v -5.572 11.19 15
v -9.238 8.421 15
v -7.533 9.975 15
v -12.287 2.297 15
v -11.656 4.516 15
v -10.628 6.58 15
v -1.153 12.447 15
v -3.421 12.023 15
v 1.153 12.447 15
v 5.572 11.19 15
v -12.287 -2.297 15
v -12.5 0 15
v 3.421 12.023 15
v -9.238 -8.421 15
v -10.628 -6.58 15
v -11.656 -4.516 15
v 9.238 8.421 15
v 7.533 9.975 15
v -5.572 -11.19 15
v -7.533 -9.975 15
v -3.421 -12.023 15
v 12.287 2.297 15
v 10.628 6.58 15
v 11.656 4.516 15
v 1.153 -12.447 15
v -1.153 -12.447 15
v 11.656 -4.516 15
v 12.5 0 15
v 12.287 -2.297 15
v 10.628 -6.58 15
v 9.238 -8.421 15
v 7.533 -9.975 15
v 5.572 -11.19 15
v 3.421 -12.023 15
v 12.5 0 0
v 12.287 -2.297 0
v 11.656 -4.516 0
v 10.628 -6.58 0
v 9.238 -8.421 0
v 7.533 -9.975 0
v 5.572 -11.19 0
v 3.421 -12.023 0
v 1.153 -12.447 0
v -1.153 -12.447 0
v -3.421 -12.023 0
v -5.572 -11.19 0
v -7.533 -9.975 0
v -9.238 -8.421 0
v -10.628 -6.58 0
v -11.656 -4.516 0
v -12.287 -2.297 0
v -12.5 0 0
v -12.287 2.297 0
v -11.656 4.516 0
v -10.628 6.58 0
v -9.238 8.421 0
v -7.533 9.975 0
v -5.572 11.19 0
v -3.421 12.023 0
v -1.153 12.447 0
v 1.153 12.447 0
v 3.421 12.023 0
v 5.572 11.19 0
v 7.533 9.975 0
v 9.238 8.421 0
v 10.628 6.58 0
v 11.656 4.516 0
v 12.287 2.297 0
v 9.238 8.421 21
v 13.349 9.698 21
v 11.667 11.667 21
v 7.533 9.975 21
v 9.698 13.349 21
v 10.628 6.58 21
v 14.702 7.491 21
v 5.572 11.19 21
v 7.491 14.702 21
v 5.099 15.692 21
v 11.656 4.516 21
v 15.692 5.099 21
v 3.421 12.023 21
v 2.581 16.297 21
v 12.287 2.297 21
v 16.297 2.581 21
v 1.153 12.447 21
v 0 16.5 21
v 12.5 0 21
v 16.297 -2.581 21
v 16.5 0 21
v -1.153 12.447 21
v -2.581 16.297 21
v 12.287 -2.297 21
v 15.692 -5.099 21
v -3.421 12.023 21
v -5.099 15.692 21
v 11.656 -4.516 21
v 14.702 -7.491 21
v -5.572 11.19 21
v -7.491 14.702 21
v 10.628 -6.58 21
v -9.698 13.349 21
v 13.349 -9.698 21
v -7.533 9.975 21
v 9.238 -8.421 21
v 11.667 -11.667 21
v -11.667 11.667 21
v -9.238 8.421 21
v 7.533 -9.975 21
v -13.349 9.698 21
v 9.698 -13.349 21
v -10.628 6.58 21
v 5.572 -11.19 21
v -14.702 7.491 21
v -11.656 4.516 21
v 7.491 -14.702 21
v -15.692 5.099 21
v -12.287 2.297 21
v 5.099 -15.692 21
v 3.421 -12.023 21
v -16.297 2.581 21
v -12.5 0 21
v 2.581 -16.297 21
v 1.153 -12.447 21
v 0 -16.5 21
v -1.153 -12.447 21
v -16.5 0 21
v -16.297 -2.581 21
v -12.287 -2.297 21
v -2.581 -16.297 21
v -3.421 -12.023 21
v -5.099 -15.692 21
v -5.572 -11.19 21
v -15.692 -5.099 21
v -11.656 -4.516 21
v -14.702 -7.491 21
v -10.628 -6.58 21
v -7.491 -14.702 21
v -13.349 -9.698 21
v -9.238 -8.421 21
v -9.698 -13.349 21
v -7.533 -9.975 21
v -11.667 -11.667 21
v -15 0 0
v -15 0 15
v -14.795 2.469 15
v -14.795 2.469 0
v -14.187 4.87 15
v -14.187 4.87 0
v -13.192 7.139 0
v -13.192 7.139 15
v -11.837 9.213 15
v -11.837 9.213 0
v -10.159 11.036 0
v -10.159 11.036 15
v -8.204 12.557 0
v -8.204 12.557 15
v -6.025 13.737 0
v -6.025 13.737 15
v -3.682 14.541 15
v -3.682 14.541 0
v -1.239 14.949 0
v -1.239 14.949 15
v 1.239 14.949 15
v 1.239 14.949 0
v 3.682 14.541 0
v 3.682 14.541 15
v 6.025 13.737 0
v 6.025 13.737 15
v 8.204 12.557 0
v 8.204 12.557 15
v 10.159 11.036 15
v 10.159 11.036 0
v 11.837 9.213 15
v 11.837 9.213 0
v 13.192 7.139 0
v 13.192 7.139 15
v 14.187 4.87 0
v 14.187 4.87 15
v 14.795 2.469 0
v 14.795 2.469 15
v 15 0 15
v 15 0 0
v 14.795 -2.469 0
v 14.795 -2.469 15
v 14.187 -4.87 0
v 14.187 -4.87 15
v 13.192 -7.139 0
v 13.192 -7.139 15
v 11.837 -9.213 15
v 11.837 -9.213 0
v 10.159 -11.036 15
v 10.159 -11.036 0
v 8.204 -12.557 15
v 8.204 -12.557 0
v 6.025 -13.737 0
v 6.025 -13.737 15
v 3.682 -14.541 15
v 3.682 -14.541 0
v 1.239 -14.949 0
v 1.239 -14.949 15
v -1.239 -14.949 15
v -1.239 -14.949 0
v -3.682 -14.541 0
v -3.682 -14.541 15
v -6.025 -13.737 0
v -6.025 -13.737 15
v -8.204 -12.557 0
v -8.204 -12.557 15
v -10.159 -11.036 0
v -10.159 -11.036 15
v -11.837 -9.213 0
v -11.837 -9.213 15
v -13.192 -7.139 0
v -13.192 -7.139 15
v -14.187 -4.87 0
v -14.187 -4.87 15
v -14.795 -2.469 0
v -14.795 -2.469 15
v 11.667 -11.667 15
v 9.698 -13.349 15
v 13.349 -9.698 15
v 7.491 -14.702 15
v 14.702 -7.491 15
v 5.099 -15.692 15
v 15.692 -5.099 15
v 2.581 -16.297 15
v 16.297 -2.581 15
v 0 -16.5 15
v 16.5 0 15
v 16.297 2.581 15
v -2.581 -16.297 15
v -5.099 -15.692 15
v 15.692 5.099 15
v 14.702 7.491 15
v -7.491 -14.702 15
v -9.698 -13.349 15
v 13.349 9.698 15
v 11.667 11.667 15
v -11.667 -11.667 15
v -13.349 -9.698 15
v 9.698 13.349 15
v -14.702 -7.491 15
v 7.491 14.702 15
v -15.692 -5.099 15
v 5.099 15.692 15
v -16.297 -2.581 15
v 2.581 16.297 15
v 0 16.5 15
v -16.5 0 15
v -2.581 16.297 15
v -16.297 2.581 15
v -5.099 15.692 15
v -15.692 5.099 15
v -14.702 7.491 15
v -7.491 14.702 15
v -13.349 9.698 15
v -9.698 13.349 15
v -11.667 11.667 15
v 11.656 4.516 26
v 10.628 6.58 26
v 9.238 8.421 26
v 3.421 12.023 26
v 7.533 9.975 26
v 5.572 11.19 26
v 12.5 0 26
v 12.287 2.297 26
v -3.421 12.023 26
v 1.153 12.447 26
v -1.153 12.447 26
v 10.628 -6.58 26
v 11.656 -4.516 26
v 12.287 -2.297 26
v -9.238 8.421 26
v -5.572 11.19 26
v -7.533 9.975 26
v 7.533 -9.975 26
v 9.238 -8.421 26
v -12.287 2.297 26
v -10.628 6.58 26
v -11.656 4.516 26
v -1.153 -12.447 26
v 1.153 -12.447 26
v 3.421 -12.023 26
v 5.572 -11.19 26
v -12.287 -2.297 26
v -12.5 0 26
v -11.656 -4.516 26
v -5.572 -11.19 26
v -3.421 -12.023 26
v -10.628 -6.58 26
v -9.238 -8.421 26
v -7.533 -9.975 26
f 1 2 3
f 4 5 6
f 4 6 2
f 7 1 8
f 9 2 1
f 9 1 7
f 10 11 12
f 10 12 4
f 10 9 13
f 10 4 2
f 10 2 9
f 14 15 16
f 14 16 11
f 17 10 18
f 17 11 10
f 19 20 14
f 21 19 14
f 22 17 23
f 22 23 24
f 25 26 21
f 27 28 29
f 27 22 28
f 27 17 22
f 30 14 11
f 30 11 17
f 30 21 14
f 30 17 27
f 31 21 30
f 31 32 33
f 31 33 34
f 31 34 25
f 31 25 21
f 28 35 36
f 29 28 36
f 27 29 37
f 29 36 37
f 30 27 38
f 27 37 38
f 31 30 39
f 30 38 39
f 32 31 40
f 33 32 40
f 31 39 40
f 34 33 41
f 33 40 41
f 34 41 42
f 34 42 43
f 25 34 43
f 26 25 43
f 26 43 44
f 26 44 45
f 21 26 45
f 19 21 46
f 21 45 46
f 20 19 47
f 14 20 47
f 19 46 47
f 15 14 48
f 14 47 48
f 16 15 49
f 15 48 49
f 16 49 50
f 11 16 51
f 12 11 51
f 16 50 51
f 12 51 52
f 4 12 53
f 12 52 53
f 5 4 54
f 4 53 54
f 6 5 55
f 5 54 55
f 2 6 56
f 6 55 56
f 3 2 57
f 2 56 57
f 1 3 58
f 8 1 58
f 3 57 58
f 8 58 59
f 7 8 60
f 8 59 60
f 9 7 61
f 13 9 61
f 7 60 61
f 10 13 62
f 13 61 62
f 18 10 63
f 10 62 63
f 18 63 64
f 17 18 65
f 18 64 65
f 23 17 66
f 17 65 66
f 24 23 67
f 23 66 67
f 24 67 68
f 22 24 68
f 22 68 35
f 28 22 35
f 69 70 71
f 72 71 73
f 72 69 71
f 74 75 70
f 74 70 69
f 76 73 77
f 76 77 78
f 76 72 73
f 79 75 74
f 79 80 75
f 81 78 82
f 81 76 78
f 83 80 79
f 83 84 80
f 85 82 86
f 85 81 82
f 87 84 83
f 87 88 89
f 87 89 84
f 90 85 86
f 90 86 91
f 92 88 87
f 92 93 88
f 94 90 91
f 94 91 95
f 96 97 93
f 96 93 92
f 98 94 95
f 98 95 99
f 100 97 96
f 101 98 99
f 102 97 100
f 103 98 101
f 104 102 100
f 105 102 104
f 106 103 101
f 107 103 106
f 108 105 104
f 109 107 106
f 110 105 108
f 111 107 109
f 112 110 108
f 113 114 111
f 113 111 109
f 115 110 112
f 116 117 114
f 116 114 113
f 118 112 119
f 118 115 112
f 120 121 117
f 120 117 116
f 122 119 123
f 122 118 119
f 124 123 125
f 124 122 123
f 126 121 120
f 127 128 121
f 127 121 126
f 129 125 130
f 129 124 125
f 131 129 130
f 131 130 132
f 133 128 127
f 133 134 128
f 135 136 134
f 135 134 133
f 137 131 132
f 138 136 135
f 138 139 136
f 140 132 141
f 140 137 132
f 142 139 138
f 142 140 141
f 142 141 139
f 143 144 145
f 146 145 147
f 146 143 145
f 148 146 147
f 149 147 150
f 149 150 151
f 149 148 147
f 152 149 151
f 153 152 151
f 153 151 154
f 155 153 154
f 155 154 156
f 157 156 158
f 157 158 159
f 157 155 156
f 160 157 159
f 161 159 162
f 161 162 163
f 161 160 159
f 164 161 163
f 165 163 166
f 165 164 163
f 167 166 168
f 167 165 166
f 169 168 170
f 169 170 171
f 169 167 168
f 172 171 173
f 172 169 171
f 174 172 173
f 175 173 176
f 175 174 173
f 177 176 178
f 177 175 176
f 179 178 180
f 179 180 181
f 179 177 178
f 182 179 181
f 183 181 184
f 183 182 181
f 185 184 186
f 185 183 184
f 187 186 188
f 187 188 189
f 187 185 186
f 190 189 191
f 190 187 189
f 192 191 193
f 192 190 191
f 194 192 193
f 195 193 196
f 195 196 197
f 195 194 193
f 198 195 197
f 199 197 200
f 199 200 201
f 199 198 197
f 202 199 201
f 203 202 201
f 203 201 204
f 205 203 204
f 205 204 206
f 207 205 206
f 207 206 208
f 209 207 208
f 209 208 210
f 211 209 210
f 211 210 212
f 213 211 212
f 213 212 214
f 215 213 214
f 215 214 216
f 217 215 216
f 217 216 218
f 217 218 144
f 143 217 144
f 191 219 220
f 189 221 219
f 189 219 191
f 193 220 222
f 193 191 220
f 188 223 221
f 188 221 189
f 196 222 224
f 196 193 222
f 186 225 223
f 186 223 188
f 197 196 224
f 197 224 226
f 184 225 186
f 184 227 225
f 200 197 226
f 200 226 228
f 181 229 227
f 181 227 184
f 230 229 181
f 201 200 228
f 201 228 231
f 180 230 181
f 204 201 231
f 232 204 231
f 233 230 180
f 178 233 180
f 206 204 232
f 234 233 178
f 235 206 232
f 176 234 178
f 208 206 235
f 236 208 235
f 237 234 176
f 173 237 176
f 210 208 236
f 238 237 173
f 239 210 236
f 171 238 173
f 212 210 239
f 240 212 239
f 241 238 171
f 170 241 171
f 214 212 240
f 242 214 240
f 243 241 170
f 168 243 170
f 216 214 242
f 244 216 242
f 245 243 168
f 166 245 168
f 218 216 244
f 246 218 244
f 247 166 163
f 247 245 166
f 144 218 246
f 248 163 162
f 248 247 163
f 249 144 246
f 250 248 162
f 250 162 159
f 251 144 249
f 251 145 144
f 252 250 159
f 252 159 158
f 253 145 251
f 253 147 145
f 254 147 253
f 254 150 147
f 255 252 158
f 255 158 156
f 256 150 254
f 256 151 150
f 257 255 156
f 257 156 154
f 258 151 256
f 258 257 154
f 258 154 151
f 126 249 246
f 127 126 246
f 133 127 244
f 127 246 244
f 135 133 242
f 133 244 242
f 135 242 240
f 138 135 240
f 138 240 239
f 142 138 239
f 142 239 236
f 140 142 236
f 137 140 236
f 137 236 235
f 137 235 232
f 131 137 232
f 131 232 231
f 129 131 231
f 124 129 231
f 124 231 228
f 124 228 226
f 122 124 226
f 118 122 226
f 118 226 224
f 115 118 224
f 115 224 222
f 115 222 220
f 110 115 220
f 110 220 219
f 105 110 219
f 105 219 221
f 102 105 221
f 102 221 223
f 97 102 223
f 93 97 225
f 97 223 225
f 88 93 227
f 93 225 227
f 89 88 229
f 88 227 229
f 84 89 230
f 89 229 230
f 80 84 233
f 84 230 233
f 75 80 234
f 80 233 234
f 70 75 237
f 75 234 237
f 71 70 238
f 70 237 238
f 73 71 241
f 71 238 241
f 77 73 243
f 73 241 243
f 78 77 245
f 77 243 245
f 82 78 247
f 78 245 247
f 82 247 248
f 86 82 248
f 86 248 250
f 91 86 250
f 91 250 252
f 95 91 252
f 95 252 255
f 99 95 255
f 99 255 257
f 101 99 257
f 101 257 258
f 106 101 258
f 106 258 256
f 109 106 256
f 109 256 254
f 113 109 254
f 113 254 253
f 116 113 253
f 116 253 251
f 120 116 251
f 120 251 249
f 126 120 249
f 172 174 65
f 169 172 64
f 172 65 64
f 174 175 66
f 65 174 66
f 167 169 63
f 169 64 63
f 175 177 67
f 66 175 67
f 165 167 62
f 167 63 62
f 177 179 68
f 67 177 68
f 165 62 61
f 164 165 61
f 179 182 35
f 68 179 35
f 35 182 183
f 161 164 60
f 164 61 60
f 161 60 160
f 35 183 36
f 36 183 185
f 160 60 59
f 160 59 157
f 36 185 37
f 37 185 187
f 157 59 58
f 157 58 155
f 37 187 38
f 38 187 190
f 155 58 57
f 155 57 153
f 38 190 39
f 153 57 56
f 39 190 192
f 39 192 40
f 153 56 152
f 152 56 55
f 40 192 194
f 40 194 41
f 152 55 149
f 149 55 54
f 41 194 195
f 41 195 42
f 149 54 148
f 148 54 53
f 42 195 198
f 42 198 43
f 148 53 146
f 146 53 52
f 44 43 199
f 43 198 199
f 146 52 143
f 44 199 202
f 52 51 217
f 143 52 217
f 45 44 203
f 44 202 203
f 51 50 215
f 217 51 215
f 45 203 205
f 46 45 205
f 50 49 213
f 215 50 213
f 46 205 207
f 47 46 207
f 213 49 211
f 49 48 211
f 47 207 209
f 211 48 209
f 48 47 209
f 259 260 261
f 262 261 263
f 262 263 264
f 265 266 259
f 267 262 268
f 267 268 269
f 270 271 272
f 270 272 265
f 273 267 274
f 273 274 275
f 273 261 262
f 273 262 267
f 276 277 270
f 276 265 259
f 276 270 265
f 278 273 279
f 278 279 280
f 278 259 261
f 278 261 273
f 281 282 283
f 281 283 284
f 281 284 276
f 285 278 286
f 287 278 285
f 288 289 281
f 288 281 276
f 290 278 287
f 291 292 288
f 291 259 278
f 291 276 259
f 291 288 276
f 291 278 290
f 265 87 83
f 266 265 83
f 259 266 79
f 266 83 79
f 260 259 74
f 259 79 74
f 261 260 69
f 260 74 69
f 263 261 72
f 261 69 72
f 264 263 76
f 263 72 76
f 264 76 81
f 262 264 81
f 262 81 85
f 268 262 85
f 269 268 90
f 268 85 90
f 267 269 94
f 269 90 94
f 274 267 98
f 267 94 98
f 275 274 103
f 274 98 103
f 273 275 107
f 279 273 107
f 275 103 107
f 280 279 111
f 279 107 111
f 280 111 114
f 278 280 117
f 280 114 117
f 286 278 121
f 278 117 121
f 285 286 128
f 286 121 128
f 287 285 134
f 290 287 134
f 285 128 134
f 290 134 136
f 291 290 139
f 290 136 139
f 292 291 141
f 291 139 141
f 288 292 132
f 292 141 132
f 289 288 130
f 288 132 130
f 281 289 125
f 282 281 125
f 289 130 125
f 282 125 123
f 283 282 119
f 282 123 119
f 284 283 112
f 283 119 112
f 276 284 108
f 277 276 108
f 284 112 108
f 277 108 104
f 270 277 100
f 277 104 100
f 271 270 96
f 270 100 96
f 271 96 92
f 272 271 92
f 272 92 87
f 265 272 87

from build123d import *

# Parameters (mm, degrees)
SKETCH1_R           = 16.5
BOSS_EXTRUDE1_DEPTH = 26
CUT_EXTRUDE1_START  = -5
SKETCH2_R           = 16.5
SKETCH2_R_2         = 12.5
CUT_EXTRUDE1_DEPTH  = 5
SKETCH3_R           = 16.5
SKETCH3_R_2         = 15
CUT_EXTRUDE2_DEPTH  = 15
SKETCH4_R           = 12.5
CUT_EXTRUDE3_DEPTH  = 15


with BuildPart() as part:
    # Sketch1 → Boss-Extrude1 (new body)
    with BuildSketch(Plane(origin=(0, 0, 0), x_dir=(0, 1, 0), z_dir=(0, 0, 1))):
        with Locations(Location((0, 0, 0), (0, 0, 90))):
            Circle(SKETCH1_R)
    extrude(amount=BOSS_EXTRUDE1_DEPTH)

    # Sketch2 → Cut-Extrude1 (cut)
    with BuildSketch(Plane.XY.offset(26).offset(CUT_EXTRUDE1_START)):
        with Locations(Location((0, 0, 0), (0, 0, 180))):
            Circle(SKETCH2_R)
        Circle(SKETCH2_R_2, mode=Mode.SUBTRACT)
    extrude(amount=CUT_EXTRUDE1_DEPTH, mode=Mode.SUBTRACT)

    # Sketch3 → Cut-Extrude2 (cut)
    with BuildSketch(Plane(origin=(0, 0, 0), x_dir=(1, 0, 0), z_dir=(0, 0, -1))):
        with Locations(Location((0, 0, 0), (0, 0, 180))):
            Circle(SKETCH3_R)
        with Locations(Location((0, 0, 0), (0, 0, 180))):
            Circle(SKETCH3_R_2, mode=Mode.SUBTRACT)
    extrude(amount=-CUT_EXTRUDE2_DEPTH, mode=Mode.SUBTRACT)

    # Sketch4 → Cut-Extrude3 (cut)
    with BuildSketch(Plane(origin=(0, 0, 0), x_dir=(1, 0, 0), z_dir=(0, 0, -1))):
        Circle(SKETCH4_R)
    extrude(amount=-CUT_EXTRUDE3_DEPTH, mode=Mode.SUBTRACT)


solid = part.part
